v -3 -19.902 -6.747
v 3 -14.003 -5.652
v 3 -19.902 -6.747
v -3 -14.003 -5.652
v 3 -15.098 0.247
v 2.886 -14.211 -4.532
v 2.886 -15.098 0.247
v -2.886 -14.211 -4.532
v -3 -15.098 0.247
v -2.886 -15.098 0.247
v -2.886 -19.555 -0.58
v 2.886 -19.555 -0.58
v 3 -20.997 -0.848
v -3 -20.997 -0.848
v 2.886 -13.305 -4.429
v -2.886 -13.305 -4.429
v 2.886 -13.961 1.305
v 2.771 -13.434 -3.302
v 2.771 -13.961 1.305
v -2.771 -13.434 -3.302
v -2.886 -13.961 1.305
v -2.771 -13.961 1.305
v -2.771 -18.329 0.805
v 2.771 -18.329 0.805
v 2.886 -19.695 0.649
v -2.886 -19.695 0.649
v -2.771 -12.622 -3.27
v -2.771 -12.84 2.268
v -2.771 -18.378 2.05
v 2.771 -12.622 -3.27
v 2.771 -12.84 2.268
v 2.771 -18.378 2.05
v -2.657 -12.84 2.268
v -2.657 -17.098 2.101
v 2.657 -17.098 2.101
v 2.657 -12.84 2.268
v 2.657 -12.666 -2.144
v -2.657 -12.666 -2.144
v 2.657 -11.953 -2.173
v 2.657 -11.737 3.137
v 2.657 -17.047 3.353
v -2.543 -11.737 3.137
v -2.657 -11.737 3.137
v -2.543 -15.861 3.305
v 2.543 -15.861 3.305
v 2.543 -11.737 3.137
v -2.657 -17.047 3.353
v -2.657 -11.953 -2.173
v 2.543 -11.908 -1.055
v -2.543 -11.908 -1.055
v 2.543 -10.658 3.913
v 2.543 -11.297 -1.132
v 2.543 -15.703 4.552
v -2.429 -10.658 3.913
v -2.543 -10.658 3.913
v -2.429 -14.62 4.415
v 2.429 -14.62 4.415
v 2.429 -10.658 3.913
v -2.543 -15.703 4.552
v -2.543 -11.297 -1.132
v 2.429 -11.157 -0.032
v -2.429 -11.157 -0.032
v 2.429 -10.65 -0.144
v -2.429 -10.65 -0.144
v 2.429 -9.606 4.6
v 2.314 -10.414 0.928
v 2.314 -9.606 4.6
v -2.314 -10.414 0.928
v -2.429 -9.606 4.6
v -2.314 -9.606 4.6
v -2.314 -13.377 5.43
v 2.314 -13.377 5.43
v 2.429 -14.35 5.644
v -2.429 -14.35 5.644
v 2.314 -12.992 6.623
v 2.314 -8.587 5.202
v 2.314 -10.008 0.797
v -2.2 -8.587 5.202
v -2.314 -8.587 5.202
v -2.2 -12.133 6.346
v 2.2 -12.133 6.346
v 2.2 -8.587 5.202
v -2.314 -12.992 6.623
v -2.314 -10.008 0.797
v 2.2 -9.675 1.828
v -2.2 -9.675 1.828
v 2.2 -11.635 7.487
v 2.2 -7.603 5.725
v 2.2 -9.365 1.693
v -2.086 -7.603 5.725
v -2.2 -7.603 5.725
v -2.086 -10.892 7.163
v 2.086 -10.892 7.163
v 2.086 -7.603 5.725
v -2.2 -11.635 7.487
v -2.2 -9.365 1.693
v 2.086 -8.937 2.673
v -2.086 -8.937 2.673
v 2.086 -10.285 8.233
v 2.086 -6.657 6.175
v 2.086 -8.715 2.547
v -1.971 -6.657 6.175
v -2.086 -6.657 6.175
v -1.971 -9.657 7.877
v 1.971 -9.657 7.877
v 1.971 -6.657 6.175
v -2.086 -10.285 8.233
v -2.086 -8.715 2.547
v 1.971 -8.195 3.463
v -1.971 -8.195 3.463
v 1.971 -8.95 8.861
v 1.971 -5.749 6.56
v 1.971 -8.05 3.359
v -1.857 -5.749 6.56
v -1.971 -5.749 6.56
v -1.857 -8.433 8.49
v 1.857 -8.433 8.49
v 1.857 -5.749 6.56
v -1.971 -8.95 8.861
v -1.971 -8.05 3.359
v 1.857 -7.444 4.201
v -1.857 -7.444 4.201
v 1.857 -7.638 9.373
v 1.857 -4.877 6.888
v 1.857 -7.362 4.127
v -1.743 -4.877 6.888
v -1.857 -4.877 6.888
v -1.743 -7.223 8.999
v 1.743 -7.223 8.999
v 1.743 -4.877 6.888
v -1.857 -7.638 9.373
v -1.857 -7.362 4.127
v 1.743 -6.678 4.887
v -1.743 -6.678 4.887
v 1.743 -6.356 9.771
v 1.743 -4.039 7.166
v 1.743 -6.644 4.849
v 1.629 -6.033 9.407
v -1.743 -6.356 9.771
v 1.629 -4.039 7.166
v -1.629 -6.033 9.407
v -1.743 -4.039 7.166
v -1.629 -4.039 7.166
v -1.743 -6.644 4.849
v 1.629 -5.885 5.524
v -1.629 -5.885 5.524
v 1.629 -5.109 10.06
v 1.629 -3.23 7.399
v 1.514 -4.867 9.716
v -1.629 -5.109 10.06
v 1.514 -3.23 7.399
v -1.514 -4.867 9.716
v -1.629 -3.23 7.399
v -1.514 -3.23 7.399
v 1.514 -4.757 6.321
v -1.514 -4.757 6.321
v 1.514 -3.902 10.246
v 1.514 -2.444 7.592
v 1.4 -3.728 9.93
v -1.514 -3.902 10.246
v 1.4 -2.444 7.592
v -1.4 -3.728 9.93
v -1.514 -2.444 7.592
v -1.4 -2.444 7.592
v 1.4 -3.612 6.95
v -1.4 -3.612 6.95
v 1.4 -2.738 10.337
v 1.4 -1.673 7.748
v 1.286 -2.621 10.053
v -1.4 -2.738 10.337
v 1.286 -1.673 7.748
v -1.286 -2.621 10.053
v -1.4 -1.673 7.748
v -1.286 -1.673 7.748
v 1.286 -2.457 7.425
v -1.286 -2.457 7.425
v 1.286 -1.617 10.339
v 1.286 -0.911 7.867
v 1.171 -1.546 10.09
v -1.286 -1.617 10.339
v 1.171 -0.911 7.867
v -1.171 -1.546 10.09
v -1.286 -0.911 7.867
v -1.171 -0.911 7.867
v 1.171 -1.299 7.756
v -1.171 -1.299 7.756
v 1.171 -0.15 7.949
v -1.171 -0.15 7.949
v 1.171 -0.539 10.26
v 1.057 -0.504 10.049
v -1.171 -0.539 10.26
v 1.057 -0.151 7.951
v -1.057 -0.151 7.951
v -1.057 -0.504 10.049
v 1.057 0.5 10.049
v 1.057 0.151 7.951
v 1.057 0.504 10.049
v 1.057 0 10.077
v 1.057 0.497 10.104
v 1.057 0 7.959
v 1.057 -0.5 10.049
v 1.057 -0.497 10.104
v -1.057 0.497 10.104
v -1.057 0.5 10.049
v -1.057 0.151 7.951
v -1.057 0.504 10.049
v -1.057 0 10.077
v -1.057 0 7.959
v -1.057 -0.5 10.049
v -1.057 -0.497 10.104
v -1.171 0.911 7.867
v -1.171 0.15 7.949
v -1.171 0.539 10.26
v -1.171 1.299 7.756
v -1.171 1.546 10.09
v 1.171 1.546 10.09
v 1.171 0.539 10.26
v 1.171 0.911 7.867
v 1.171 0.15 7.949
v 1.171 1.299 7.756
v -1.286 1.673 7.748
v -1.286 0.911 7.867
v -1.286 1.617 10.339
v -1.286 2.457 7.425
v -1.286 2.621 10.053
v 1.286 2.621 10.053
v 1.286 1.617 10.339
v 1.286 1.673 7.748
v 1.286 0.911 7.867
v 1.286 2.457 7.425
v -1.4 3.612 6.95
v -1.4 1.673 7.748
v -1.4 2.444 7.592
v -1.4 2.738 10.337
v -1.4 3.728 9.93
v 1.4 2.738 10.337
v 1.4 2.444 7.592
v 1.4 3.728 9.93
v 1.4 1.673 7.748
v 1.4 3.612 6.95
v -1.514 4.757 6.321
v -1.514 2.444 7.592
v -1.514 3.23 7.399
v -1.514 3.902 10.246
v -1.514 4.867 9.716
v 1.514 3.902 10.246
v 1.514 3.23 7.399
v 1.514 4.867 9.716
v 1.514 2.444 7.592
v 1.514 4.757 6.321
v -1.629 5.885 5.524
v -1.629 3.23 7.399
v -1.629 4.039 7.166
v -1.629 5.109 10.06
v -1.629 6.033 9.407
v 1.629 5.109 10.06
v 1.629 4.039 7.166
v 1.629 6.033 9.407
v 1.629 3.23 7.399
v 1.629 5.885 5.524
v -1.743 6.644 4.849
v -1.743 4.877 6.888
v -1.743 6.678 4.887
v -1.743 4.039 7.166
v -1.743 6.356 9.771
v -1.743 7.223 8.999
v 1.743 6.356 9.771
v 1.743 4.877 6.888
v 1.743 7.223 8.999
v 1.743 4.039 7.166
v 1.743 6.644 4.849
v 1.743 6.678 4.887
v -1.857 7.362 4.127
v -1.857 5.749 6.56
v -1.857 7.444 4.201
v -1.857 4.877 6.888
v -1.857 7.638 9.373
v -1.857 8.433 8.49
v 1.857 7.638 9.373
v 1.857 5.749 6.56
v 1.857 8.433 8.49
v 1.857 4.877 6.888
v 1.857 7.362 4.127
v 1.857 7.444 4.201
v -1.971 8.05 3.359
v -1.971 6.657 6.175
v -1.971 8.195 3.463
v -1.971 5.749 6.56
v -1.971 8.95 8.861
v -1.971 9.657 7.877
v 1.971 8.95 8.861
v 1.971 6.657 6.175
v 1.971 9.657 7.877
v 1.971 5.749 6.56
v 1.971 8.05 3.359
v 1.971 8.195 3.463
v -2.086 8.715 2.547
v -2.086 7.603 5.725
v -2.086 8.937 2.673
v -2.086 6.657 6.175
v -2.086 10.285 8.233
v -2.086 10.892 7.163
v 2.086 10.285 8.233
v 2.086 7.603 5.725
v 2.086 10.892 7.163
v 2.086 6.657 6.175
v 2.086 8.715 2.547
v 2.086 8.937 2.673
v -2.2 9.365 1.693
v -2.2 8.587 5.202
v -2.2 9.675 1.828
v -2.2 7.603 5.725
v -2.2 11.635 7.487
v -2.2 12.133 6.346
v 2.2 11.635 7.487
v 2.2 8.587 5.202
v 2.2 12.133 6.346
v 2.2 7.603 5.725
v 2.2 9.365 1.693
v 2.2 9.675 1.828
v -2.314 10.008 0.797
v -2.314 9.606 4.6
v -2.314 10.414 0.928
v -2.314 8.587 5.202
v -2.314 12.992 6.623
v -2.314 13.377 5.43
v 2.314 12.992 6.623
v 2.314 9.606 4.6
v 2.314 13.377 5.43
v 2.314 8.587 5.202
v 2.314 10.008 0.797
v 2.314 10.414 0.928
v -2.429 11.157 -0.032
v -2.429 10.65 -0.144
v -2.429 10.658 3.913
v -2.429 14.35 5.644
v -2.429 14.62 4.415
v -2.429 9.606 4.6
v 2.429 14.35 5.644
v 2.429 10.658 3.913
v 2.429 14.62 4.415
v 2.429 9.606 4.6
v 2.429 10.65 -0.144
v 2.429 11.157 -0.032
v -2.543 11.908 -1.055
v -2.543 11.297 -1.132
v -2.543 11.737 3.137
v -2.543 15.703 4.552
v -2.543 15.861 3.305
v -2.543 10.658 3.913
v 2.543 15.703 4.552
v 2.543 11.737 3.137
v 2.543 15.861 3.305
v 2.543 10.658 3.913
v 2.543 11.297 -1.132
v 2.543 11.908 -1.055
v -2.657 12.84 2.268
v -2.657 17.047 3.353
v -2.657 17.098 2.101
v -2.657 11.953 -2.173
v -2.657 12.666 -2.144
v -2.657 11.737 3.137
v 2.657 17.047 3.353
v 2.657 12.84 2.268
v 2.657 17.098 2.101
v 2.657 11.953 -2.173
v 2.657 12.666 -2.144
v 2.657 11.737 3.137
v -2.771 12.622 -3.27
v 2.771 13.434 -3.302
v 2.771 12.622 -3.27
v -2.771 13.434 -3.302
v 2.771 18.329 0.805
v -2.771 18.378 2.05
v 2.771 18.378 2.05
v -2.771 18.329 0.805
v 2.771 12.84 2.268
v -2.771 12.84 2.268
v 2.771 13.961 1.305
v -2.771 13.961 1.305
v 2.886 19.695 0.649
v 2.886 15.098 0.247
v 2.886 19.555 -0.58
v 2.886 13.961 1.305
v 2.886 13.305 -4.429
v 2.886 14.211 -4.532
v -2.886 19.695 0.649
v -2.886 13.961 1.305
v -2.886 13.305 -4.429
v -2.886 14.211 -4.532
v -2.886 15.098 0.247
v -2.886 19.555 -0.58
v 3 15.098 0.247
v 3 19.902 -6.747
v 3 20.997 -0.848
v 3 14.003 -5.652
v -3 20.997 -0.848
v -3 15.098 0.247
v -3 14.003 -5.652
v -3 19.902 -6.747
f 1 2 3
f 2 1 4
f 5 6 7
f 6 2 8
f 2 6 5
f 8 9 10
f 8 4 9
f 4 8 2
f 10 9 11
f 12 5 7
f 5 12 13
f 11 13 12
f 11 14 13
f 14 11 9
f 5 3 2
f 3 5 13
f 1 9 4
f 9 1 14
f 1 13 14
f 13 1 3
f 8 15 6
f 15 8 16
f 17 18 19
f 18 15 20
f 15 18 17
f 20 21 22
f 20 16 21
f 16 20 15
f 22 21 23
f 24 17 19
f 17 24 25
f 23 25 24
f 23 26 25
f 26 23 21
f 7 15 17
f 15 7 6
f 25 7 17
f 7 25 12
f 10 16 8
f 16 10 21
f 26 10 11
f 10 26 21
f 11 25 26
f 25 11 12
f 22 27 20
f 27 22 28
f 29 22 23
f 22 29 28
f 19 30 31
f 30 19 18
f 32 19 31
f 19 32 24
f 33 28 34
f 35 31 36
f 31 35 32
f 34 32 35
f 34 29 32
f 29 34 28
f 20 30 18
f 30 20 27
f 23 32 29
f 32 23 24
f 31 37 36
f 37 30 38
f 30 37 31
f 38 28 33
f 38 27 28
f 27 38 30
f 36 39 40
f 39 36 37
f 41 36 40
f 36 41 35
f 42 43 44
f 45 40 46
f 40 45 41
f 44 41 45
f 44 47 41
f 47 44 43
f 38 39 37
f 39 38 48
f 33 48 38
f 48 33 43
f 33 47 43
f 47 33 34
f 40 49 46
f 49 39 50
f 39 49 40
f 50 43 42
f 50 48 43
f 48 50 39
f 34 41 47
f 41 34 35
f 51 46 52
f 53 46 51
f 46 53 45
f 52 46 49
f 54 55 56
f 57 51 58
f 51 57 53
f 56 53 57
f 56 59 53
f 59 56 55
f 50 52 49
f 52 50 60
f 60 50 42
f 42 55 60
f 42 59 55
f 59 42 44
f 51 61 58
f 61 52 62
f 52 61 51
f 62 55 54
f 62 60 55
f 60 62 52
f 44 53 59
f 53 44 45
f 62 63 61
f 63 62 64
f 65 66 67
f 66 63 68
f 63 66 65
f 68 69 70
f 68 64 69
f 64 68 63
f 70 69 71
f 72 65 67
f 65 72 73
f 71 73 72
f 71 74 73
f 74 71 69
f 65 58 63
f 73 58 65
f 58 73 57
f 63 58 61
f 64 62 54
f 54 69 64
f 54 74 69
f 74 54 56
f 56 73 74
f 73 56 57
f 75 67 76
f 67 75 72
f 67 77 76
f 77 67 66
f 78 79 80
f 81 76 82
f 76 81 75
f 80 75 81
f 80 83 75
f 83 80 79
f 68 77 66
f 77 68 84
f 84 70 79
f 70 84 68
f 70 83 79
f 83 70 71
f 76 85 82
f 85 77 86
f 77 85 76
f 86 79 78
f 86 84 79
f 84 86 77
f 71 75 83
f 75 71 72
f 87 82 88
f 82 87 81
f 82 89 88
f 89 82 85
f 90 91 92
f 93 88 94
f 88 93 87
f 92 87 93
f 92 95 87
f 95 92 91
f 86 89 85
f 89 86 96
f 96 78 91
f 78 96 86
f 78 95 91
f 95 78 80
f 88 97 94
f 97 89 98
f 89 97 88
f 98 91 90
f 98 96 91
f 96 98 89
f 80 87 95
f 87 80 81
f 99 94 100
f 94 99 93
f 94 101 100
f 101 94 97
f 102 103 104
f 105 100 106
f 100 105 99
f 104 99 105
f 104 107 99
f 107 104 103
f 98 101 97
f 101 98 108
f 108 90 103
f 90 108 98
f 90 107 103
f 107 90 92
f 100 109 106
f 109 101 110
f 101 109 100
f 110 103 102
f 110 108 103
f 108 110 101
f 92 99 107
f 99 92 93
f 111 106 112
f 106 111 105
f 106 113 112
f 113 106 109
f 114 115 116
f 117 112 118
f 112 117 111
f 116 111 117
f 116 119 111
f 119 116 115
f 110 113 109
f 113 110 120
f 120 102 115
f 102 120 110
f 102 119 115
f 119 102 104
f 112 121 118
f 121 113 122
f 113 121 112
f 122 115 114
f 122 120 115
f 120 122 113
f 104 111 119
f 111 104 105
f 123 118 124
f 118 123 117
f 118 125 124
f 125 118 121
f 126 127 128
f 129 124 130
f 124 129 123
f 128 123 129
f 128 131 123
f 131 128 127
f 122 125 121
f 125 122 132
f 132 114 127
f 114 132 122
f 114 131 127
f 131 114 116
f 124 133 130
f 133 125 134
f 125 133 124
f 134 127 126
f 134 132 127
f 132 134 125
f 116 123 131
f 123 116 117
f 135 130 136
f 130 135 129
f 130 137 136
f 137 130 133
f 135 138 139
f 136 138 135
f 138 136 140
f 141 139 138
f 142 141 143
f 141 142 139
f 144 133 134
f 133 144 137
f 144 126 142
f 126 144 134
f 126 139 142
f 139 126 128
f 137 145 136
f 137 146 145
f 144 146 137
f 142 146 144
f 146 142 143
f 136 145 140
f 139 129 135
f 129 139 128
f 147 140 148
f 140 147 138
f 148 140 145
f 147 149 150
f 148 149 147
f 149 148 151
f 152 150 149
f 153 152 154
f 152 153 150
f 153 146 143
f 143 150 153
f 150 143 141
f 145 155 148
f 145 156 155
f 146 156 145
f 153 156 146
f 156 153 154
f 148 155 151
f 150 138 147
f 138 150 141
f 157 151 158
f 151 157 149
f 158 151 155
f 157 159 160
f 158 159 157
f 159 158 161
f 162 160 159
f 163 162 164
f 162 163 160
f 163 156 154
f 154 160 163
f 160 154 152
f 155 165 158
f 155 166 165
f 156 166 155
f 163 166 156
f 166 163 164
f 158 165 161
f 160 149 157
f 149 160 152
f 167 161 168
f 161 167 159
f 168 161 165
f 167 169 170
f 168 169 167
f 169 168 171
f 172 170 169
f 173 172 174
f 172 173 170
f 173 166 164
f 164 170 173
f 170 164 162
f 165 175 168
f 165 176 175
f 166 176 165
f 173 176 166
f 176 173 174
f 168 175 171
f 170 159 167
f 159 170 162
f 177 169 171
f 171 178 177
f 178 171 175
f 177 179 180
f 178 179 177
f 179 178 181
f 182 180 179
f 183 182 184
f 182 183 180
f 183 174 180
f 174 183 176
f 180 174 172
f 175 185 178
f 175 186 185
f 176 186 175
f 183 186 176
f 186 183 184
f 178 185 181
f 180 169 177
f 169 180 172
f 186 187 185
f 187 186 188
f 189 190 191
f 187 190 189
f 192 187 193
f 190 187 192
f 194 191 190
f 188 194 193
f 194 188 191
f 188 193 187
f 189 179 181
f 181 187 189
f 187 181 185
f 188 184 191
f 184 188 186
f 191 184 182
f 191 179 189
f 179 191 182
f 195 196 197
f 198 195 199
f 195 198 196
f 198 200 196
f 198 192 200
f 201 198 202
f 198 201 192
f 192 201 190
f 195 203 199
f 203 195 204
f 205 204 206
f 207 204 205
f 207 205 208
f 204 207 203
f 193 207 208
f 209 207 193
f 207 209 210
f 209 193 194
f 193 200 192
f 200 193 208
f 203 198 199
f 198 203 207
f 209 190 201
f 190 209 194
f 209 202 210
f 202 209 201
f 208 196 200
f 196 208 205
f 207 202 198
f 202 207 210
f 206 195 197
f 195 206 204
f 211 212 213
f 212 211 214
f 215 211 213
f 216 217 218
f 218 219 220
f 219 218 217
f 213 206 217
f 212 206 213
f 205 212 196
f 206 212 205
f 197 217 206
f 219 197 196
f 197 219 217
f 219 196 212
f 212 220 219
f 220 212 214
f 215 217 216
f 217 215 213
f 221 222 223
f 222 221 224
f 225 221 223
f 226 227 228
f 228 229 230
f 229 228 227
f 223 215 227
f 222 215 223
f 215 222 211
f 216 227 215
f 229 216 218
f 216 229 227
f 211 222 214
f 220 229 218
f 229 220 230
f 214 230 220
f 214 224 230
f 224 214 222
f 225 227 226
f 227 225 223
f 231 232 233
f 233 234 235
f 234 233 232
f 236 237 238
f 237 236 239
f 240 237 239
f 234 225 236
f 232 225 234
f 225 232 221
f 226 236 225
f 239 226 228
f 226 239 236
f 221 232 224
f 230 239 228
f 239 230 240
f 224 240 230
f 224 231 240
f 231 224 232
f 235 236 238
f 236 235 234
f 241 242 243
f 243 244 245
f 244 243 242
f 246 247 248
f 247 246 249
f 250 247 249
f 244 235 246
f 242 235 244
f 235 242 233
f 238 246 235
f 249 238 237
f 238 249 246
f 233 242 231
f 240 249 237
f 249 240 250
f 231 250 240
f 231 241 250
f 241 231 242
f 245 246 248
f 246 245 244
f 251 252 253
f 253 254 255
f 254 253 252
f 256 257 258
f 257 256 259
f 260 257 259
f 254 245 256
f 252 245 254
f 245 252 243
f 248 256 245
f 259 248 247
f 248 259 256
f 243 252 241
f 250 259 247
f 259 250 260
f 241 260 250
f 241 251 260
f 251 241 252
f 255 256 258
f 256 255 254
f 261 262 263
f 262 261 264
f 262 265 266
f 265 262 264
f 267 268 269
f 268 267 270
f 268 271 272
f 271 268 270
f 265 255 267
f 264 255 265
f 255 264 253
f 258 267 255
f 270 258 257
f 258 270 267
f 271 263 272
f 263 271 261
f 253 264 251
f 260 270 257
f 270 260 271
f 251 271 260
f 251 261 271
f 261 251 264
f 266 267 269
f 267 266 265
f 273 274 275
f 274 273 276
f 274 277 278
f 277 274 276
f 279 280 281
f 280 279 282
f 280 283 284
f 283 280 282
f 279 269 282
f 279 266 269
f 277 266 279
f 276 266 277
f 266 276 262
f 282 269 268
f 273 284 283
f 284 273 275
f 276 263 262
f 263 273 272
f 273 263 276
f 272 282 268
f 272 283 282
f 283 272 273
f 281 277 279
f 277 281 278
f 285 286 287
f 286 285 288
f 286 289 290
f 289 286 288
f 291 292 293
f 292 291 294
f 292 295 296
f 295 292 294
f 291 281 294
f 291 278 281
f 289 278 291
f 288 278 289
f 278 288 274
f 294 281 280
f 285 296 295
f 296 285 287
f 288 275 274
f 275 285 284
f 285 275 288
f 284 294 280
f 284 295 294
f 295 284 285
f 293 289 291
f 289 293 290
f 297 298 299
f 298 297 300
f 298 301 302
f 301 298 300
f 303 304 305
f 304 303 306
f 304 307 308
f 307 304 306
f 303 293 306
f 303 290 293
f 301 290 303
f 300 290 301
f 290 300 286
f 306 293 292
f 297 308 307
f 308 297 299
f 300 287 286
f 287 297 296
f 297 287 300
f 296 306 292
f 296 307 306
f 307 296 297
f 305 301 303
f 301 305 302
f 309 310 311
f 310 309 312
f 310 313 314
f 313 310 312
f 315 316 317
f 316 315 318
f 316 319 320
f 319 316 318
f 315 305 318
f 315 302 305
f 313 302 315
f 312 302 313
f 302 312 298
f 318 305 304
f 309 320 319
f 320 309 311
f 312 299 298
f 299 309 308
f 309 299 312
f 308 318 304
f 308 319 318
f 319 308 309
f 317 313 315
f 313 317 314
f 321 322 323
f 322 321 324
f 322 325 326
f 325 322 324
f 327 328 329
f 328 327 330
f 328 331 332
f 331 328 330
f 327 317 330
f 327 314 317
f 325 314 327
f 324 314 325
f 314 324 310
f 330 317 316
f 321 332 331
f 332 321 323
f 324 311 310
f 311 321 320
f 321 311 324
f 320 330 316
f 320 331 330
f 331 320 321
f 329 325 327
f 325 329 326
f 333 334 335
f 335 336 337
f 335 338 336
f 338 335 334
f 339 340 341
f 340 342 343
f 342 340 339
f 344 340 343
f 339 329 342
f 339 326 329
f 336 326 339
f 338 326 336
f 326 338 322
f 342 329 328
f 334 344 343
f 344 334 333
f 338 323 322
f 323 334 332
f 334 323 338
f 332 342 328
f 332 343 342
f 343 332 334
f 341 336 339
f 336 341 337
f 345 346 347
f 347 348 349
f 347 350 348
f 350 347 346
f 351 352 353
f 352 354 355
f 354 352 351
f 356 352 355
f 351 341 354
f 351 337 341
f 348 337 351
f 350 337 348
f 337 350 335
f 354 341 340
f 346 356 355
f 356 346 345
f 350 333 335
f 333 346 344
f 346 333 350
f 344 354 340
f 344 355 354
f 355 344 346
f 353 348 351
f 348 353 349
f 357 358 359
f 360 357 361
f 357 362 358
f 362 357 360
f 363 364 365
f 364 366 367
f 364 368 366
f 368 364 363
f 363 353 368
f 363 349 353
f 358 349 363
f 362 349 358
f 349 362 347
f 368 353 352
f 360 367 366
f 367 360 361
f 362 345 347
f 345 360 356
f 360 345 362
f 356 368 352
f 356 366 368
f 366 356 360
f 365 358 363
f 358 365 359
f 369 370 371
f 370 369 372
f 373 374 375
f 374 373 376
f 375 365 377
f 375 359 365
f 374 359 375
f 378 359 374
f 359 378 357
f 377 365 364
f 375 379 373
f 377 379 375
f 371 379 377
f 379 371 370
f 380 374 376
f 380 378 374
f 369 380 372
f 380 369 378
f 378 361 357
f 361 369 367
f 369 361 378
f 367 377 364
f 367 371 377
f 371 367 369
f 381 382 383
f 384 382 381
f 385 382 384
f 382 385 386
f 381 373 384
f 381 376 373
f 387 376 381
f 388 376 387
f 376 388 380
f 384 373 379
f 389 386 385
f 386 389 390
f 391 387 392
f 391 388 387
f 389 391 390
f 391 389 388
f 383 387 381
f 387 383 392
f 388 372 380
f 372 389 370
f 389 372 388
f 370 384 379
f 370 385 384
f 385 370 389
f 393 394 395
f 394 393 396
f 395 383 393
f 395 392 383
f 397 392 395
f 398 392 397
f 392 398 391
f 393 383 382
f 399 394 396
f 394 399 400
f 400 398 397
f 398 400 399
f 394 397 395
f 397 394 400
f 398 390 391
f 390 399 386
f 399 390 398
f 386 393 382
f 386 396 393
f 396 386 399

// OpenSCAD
//parabola(40, 10, 1, 10);
//rotate([0,0,45])
//parabolic_arch (40, 10, 1, 10);
//rotate([0,0,135])

arch(40,10,10,2,1);
//rotate([0,0,90])

//arch2(40,10,10,2,1);

//Creates a filled parabola, using mirrored endpoints.
//d: The distance between the two mirrored endpoints at the base of the parabola.
//roundness: How "rounded" the parabola is.
//h: The height of the parabola's vertex.
//thickness: The thickness of the parabolic section.
module parabola(d, h, roundness, thickness)
{
    r=d*(roundness+1)/2;
    
    distance=sqrt(pow(r,2)-pow((d/2),2));//The distance between the cone's axis and the chord between the two points.
    if(distance!=0)
    {
        run=r-distance; //Assuming a line from the cone's vertex through the parabola's vertex, the horizontal distance underneath the segment between the vertex and the base.
     //The slope of the cone.
        slope=h/run;
        height=r*slope; //The height of the cone.
        section_height=h+thickness*slope+2;
        intersection()
        {
            translate([-distance,0,0])
            cylinder(r1=r, r2=0, h=height);
            
            translate([0,0,section_height/2])
            cube([thickness, d+run*2, section_height], center=true);
        }
    }
    else
    {
        intersection()
        {
            cylinder(r1=d/2, r2=0, h=h);
            
            translate([0,0,h/2+1])
            cube([thickness, d, h+2], center=true);
        }
    }
}

module multi_parabola(d, h, roundness, thickness, resolution)
{
    slice_width=thickness/resolution;
    left_hand=-thickness/2;
    for(i=[0:resolution])
    {
        translate([left_hand+slice_width*i,0,0])
        parabola(d, h, roundness, slice_width+1);
    }
}

module parabolic_arch(d,h,roundness, thickness)
{
    if(roundness==0)
    {
        hull()
        intersection()
        {
            union()
            {
                translate([thickness/2,0,0])
                cylinder(r1=d/2, r2=0, h=h);
                translate([-thickness/2,0,0])
                cylinder(r1=d/2, r2=0, h=h);
            }
            translate([0,0,h/2+1])
            cube([thickness, d, h+2], center=true);
        }
    }
    else
    {
        r=d*(roundness+1)/2;
        distance=sqrt(pow(r,2)-pow(d/2,2));
        cone_offset=distance+thickness/2;
        run=r-distance;
        slope=h/run;
        height=r*slope;
        hull()
        intersection()
        {
            union()
            {
                translate([cone_offset,0,0])
                cylinder(r1=r,r2=0,h=height);
                translate([-cone_offset,0,0])
                cylinder(r1=r, r2=0, h=height);
            }
            translate([0,0,h/2+1])
            cube([thickness, d, h+2], center=true);
        }
    }
}

module arch2(d, h, t0, t1, resolution)
{
    steps=d/resolution;
    thick_step=(t0-t1)/steps;
    for(i=[-steps/2:steps/2])
    {
        thickness=thick_step*abs(i)+t1;
        hyp_thickness=thickness/sqrt(2);
        y=i*resolution;
        z=zpos(y,d,h);
        translate([0,y,z])
        rotate([atan(z/y)+45,0,0])
        cube([thickness,hyp_thickness,hyp_thickness], center=true);
    }
}

module arch(d, h, t0, t1, resolution)
{
    steps=(d-t0/2)/resolution;
    thick_step=(t0-t1)/steps;
    for(i=[-steps/2:steps/2])
    {
        thickness=thick_step*abs(i)+t1;
        y=i*resolution;
        z=zpos(y,d-t0,h-t1/2);
        translate([0,y,z])
        rotate([atan(z/y),0,0])
        cube([thickness,thickness,thickness], center=true);
    }
}

function zpos(x, width, height)=height*(1-pow(abs(x/(width/2)), 2));
